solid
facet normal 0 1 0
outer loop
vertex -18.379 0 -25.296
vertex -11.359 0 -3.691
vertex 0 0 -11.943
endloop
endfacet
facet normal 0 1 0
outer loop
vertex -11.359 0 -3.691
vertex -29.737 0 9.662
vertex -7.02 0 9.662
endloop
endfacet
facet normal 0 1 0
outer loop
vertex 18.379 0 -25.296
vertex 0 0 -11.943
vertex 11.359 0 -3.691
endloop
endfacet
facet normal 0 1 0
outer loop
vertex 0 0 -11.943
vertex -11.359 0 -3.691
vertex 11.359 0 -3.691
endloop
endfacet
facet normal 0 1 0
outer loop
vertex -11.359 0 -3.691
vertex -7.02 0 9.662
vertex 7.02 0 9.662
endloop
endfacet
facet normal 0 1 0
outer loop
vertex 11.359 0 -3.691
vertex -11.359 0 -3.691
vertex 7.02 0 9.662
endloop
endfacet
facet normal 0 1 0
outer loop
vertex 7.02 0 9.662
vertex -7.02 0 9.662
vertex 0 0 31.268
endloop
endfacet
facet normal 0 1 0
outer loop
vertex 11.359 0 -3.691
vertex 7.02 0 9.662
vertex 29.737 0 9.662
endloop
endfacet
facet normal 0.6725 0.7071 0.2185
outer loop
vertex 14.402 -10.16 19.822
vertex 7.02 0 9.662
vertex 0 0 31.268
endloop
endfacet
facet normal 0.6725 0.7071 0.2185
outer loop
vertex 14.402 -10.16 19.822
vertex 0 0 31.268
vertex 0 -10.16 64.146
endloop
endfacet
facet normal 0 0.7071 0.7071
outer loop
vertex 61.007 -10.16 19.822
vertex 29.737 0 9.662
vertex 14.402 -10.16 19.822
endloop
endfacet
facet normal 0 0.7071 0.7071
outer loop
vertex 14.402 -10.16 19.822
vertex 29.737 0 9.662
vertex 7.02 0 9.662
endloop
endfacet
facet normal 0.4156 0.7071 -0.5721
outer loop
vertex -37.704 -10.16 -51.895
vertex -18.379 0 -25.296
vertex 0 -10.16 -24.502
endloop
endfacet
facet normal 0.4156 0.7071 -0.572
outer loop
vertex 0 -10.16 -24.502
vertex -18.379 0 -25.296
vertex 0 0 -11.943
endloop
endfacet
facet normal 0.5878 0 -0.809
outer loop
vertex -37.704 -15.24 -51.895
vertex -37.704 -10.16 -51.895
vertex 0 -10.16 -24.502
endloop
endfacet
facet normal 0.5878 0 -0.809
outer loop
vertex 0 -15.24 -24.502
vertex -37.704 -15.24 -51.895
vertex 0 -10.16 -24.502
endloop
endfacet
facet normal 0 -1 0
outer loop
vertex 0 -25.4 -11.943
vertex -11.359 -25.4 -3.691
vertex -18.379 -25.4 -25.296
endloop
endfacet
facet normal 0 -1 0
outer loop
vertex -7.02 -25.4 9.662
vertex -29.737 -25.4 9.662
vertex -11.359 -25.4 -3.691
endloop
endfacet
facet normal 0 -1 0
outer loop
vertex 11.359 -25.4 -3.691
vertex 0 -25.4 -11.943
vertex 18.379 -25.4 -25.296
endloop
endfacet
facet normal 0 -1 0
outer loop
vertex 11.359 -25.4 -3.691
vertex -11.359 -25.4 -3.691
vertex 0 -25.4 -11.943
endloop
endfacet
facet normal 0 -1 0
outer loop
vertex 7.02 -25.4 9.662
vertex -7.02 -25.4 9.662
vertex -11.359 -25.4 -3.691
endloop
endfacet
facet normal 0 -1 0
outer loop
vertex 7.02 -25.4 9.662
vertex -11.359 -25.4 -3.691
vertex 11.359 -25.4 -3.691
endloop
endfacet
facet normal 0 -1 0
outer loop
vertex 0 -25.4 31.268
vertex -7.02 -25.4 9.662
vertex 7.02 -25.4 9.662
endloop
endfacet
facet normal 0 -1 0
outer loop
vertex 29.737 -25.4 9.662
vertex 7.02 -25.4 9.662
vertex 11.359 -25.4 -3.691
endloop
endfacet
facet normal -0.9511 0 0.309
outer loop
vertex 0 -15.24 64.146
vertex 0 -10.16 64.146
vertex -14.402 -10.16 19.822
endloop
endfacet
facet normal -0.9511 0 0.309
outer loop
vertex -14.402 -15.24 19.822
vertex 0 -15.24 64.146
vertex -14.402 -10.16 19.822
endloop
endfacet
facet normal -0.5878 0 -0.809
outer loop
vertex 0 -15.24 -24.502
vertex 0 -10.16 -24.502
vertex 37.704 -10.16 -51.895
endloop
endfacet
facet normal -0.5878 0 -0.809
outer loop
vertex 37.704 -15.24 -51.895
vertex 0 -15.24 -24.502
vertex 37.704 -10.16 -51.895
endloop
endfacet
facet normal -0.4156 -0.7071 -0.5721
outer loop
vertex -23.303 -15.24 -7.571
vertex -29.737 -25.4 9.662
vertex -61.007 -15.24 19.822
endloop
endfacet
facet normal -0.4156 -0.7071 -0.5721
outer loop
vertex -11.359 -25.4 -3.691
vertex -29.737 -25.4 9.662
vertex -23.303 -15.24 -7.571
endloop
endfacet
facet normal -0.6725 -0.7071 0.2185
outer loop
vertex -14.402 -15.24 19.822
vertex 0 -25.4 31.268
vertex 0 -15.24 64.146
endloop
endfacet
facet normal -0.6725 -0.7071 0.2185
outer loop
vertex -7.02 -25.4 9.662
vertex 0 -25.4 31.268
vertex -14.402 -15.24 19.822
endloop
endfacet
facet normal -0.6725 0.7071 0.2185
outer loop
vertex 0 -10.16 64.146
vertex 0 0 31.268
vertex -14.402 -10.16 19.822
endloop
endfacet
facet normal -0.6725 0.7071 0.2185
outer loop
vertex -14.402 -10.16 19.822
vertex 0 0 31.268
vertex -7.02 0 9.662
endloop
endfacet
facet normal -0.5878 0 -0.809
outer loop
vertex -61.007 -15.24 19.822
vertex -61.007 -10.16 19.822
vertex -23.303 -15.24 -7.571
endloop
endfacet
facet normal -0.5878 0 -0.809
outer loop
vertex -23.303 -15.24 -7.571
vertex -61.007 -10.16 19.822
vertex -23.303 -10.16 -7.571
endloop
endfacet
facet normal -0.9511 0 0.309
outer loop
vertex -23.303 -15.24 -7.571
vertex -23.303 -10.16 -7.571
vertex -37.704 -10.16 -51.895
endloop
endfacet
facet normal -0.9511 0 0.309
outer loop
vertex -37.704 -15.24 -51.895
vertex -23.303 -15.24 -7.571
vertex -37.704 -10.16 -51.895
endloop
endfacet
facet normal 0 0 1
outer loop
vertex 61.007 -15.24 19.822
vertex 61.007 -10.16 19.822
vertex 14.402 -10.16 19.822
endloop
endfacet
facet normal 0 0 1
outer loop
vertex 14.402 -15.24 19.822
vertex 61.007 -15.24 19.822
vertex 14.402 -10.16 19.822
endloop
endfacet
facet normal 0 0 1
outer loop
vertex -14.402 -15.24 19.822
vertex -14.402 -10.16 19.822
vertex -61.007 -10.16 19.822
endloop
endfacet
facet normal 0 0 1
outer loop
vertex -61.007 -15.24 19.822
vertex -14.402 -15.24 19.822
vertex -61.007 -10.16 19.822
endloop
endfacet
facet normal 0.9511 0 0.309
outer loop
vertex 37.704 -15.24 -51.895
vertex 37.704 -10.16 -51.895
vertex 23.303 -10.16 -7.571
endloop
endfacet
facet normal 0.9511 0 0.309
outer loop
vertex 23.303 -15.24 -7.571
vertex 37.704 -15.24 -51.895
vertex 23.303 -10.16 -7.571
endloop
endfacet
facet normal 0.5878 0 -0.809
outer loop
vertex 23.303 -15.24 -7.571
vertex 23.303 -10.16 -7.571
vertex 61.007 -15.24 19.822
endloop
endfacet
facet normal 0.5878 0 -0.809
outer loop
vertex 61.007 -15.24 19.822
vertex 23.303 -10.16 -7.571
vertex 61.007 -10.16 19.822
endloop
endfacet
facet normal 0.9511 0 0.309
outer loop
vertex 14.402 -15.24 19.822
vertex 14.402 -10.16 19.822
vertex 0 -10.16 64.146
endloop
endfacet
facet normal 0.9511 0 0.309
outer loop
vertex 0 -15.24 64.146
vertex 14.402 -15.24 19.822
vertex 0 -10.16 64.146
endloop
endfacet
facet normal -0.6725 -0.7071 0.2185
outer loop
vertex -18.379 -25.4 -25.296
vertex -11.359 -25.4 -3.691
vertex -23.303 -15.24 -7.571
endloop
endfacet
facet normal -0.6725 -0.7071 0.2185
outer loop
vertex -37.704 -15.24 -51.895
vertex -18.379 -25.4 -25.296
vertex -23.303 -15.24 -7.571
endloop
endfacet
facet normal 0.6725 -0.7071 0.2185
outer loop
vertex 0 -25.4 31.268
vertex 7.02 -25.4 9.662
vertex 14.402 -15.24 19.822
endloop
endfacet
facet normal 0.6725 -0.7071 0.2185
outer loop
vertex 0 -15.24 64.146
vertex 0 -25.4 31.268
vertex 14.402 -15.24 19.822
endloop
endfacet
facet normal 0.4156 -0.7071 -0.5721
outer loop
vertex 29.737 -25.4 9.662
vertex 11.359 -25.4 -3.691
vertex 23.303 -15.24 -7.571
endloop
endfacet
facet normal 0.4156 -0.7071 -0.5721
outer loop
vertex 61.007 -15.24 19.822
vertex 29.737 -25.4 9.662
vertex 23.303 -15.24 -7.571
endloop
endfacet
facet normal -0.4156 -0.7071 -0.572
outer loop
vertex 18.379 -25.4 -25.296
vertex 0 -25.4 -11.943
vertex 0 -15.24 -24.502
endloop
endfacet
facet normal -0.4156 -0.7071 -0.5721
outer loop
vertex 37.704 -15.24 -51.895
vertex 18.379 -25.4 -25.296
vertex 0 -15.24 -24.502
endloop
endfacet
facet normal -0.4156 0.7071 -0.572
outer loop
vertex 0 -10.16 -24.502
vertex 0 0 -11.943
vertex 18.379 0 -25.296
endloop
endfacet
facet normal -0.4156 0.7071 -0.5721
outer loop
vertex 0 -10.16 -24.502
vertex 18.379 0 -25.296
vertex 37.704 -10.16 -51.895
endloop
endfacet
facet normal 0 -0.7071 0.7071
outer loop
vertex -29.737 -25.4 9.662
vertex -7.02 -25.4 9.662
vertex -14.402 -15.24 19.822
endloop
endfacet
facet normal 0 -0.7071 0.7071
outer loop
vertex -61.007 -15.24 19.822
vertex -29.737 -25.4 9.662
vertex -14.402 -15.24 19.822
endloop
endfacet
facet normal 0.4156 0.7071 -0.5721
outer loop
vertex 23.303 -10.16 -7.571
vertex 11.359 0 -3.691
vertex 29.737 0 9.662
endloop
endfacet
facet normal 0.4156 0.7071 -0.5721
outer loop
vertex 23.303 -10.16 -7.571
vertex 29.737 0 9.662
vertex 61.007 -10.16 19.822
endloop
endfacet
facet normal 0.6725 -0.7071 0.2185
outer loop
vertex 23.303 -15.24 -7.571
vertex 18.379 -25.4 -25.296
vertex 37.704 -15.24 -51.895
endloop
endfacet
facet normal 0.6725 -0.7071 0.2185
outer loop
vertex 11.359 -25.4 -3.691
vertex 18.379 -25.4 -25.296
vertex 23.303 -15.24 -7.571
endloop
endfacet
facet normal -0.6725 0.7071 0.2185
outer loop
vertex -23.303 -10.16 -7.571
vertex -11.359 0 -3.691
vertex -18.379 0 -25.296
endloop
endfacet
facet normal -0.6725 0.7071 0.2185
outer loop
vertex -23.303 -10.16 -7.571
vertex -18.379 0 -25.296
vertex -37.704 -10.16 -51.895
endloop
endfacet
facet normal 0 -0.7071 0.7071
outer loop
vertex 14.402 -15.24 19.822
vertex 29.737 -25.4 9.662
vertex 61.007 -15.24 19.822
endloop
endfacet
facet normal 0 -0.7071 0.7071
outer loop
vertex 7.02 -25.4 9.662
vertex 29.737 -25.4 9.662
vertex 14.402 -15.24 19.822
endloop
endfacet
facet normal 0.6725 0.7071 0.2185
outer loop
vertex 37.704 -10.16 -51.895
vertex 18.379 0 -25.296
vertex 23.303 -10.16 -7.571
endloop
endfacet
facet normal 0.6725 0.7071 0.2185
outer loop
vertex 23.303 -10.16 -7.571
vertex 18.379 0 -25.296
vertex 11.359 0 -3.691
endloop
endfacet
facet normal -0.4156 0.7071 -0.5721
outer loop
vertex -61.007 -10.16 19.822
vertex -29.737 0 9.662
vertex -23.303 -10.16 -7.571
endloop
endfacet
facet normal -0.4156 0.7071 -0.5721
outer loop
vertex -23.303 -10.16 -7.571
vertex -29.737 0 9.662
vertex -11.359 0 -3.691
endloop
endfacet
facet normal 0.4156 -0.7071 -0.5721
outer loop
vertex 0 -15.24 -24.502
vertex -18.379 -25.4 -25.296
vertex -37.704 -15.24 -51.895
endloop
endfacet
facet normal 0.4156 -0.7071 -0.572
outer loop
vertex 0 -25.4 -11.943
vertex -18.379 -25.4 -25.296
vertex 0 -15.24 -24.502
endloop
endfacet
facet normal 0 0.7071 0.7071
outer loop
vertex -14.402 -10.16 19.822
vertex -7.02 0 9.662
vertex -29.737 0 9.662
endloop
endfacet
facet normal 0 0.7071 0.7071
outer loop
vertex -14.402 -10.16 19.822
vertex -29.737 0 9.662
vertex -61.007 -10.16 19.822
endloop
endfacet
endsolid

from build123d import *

# Parameters (mm, degrees)
F1_DEPTH = 25.4
F2_SIZE  = 10.16


with BuildPart() as f1:
    # F0 (on Front) → F1 (new body)
    with BuildSketch(Plane.XZ):
        Polygon((14.401741, 19.822295), (0, 64.146296), (-14.401741, 19.822295), (-61.006753, 19.822295), (-23.302506, -7.571443), (-37.704247, -51.895443), (0, -24.501705), (37.704247, -51.895443), (23.302506, -7.571443), (61.006753, 19.822295), align=None)
    extrude(amount=F1_DEPTH)

    # F2
    f2_edges = [f1.edges().sort_by_distance(p)[0] for p in [
        (42.154629, -25.4, 6.125426),
        (37.704247, -25.4, 19.822295),
        (7.20087, -25.4, 41.984296),
        (-7.20087, -25.4, 41.984296),
        (-37.704247, -25.4, 19.822295),
        (-42.154629, -25.4, 6.125426),
        (-30.503376, -25.4, -29.733443),
        (-18.852123, -25.4, -38.198574),
        (18.852123, -25.4, -38.198574),
        (30.503376, -25.4, -29.733443),
        (42.154629, 0, 6.125426),
        (37.704247, 0, 19.822295),
        (7.20087, 0, 41.984296),
        (-7.20087, 0, 41.984296),
        (-37.704247, 0, 19.822295),
        (-42.154629, 0, 6.125426),
        (-30.503376, 0, -29.733443),
        (-18.852123, 0, -38.198574),
        (18.852123, 0, -38.198574),
        (30.503376, 0, -29.733443),
    ]]
    chamfer(f2_edges, length=F2_SIZE)


solid = f1.part
